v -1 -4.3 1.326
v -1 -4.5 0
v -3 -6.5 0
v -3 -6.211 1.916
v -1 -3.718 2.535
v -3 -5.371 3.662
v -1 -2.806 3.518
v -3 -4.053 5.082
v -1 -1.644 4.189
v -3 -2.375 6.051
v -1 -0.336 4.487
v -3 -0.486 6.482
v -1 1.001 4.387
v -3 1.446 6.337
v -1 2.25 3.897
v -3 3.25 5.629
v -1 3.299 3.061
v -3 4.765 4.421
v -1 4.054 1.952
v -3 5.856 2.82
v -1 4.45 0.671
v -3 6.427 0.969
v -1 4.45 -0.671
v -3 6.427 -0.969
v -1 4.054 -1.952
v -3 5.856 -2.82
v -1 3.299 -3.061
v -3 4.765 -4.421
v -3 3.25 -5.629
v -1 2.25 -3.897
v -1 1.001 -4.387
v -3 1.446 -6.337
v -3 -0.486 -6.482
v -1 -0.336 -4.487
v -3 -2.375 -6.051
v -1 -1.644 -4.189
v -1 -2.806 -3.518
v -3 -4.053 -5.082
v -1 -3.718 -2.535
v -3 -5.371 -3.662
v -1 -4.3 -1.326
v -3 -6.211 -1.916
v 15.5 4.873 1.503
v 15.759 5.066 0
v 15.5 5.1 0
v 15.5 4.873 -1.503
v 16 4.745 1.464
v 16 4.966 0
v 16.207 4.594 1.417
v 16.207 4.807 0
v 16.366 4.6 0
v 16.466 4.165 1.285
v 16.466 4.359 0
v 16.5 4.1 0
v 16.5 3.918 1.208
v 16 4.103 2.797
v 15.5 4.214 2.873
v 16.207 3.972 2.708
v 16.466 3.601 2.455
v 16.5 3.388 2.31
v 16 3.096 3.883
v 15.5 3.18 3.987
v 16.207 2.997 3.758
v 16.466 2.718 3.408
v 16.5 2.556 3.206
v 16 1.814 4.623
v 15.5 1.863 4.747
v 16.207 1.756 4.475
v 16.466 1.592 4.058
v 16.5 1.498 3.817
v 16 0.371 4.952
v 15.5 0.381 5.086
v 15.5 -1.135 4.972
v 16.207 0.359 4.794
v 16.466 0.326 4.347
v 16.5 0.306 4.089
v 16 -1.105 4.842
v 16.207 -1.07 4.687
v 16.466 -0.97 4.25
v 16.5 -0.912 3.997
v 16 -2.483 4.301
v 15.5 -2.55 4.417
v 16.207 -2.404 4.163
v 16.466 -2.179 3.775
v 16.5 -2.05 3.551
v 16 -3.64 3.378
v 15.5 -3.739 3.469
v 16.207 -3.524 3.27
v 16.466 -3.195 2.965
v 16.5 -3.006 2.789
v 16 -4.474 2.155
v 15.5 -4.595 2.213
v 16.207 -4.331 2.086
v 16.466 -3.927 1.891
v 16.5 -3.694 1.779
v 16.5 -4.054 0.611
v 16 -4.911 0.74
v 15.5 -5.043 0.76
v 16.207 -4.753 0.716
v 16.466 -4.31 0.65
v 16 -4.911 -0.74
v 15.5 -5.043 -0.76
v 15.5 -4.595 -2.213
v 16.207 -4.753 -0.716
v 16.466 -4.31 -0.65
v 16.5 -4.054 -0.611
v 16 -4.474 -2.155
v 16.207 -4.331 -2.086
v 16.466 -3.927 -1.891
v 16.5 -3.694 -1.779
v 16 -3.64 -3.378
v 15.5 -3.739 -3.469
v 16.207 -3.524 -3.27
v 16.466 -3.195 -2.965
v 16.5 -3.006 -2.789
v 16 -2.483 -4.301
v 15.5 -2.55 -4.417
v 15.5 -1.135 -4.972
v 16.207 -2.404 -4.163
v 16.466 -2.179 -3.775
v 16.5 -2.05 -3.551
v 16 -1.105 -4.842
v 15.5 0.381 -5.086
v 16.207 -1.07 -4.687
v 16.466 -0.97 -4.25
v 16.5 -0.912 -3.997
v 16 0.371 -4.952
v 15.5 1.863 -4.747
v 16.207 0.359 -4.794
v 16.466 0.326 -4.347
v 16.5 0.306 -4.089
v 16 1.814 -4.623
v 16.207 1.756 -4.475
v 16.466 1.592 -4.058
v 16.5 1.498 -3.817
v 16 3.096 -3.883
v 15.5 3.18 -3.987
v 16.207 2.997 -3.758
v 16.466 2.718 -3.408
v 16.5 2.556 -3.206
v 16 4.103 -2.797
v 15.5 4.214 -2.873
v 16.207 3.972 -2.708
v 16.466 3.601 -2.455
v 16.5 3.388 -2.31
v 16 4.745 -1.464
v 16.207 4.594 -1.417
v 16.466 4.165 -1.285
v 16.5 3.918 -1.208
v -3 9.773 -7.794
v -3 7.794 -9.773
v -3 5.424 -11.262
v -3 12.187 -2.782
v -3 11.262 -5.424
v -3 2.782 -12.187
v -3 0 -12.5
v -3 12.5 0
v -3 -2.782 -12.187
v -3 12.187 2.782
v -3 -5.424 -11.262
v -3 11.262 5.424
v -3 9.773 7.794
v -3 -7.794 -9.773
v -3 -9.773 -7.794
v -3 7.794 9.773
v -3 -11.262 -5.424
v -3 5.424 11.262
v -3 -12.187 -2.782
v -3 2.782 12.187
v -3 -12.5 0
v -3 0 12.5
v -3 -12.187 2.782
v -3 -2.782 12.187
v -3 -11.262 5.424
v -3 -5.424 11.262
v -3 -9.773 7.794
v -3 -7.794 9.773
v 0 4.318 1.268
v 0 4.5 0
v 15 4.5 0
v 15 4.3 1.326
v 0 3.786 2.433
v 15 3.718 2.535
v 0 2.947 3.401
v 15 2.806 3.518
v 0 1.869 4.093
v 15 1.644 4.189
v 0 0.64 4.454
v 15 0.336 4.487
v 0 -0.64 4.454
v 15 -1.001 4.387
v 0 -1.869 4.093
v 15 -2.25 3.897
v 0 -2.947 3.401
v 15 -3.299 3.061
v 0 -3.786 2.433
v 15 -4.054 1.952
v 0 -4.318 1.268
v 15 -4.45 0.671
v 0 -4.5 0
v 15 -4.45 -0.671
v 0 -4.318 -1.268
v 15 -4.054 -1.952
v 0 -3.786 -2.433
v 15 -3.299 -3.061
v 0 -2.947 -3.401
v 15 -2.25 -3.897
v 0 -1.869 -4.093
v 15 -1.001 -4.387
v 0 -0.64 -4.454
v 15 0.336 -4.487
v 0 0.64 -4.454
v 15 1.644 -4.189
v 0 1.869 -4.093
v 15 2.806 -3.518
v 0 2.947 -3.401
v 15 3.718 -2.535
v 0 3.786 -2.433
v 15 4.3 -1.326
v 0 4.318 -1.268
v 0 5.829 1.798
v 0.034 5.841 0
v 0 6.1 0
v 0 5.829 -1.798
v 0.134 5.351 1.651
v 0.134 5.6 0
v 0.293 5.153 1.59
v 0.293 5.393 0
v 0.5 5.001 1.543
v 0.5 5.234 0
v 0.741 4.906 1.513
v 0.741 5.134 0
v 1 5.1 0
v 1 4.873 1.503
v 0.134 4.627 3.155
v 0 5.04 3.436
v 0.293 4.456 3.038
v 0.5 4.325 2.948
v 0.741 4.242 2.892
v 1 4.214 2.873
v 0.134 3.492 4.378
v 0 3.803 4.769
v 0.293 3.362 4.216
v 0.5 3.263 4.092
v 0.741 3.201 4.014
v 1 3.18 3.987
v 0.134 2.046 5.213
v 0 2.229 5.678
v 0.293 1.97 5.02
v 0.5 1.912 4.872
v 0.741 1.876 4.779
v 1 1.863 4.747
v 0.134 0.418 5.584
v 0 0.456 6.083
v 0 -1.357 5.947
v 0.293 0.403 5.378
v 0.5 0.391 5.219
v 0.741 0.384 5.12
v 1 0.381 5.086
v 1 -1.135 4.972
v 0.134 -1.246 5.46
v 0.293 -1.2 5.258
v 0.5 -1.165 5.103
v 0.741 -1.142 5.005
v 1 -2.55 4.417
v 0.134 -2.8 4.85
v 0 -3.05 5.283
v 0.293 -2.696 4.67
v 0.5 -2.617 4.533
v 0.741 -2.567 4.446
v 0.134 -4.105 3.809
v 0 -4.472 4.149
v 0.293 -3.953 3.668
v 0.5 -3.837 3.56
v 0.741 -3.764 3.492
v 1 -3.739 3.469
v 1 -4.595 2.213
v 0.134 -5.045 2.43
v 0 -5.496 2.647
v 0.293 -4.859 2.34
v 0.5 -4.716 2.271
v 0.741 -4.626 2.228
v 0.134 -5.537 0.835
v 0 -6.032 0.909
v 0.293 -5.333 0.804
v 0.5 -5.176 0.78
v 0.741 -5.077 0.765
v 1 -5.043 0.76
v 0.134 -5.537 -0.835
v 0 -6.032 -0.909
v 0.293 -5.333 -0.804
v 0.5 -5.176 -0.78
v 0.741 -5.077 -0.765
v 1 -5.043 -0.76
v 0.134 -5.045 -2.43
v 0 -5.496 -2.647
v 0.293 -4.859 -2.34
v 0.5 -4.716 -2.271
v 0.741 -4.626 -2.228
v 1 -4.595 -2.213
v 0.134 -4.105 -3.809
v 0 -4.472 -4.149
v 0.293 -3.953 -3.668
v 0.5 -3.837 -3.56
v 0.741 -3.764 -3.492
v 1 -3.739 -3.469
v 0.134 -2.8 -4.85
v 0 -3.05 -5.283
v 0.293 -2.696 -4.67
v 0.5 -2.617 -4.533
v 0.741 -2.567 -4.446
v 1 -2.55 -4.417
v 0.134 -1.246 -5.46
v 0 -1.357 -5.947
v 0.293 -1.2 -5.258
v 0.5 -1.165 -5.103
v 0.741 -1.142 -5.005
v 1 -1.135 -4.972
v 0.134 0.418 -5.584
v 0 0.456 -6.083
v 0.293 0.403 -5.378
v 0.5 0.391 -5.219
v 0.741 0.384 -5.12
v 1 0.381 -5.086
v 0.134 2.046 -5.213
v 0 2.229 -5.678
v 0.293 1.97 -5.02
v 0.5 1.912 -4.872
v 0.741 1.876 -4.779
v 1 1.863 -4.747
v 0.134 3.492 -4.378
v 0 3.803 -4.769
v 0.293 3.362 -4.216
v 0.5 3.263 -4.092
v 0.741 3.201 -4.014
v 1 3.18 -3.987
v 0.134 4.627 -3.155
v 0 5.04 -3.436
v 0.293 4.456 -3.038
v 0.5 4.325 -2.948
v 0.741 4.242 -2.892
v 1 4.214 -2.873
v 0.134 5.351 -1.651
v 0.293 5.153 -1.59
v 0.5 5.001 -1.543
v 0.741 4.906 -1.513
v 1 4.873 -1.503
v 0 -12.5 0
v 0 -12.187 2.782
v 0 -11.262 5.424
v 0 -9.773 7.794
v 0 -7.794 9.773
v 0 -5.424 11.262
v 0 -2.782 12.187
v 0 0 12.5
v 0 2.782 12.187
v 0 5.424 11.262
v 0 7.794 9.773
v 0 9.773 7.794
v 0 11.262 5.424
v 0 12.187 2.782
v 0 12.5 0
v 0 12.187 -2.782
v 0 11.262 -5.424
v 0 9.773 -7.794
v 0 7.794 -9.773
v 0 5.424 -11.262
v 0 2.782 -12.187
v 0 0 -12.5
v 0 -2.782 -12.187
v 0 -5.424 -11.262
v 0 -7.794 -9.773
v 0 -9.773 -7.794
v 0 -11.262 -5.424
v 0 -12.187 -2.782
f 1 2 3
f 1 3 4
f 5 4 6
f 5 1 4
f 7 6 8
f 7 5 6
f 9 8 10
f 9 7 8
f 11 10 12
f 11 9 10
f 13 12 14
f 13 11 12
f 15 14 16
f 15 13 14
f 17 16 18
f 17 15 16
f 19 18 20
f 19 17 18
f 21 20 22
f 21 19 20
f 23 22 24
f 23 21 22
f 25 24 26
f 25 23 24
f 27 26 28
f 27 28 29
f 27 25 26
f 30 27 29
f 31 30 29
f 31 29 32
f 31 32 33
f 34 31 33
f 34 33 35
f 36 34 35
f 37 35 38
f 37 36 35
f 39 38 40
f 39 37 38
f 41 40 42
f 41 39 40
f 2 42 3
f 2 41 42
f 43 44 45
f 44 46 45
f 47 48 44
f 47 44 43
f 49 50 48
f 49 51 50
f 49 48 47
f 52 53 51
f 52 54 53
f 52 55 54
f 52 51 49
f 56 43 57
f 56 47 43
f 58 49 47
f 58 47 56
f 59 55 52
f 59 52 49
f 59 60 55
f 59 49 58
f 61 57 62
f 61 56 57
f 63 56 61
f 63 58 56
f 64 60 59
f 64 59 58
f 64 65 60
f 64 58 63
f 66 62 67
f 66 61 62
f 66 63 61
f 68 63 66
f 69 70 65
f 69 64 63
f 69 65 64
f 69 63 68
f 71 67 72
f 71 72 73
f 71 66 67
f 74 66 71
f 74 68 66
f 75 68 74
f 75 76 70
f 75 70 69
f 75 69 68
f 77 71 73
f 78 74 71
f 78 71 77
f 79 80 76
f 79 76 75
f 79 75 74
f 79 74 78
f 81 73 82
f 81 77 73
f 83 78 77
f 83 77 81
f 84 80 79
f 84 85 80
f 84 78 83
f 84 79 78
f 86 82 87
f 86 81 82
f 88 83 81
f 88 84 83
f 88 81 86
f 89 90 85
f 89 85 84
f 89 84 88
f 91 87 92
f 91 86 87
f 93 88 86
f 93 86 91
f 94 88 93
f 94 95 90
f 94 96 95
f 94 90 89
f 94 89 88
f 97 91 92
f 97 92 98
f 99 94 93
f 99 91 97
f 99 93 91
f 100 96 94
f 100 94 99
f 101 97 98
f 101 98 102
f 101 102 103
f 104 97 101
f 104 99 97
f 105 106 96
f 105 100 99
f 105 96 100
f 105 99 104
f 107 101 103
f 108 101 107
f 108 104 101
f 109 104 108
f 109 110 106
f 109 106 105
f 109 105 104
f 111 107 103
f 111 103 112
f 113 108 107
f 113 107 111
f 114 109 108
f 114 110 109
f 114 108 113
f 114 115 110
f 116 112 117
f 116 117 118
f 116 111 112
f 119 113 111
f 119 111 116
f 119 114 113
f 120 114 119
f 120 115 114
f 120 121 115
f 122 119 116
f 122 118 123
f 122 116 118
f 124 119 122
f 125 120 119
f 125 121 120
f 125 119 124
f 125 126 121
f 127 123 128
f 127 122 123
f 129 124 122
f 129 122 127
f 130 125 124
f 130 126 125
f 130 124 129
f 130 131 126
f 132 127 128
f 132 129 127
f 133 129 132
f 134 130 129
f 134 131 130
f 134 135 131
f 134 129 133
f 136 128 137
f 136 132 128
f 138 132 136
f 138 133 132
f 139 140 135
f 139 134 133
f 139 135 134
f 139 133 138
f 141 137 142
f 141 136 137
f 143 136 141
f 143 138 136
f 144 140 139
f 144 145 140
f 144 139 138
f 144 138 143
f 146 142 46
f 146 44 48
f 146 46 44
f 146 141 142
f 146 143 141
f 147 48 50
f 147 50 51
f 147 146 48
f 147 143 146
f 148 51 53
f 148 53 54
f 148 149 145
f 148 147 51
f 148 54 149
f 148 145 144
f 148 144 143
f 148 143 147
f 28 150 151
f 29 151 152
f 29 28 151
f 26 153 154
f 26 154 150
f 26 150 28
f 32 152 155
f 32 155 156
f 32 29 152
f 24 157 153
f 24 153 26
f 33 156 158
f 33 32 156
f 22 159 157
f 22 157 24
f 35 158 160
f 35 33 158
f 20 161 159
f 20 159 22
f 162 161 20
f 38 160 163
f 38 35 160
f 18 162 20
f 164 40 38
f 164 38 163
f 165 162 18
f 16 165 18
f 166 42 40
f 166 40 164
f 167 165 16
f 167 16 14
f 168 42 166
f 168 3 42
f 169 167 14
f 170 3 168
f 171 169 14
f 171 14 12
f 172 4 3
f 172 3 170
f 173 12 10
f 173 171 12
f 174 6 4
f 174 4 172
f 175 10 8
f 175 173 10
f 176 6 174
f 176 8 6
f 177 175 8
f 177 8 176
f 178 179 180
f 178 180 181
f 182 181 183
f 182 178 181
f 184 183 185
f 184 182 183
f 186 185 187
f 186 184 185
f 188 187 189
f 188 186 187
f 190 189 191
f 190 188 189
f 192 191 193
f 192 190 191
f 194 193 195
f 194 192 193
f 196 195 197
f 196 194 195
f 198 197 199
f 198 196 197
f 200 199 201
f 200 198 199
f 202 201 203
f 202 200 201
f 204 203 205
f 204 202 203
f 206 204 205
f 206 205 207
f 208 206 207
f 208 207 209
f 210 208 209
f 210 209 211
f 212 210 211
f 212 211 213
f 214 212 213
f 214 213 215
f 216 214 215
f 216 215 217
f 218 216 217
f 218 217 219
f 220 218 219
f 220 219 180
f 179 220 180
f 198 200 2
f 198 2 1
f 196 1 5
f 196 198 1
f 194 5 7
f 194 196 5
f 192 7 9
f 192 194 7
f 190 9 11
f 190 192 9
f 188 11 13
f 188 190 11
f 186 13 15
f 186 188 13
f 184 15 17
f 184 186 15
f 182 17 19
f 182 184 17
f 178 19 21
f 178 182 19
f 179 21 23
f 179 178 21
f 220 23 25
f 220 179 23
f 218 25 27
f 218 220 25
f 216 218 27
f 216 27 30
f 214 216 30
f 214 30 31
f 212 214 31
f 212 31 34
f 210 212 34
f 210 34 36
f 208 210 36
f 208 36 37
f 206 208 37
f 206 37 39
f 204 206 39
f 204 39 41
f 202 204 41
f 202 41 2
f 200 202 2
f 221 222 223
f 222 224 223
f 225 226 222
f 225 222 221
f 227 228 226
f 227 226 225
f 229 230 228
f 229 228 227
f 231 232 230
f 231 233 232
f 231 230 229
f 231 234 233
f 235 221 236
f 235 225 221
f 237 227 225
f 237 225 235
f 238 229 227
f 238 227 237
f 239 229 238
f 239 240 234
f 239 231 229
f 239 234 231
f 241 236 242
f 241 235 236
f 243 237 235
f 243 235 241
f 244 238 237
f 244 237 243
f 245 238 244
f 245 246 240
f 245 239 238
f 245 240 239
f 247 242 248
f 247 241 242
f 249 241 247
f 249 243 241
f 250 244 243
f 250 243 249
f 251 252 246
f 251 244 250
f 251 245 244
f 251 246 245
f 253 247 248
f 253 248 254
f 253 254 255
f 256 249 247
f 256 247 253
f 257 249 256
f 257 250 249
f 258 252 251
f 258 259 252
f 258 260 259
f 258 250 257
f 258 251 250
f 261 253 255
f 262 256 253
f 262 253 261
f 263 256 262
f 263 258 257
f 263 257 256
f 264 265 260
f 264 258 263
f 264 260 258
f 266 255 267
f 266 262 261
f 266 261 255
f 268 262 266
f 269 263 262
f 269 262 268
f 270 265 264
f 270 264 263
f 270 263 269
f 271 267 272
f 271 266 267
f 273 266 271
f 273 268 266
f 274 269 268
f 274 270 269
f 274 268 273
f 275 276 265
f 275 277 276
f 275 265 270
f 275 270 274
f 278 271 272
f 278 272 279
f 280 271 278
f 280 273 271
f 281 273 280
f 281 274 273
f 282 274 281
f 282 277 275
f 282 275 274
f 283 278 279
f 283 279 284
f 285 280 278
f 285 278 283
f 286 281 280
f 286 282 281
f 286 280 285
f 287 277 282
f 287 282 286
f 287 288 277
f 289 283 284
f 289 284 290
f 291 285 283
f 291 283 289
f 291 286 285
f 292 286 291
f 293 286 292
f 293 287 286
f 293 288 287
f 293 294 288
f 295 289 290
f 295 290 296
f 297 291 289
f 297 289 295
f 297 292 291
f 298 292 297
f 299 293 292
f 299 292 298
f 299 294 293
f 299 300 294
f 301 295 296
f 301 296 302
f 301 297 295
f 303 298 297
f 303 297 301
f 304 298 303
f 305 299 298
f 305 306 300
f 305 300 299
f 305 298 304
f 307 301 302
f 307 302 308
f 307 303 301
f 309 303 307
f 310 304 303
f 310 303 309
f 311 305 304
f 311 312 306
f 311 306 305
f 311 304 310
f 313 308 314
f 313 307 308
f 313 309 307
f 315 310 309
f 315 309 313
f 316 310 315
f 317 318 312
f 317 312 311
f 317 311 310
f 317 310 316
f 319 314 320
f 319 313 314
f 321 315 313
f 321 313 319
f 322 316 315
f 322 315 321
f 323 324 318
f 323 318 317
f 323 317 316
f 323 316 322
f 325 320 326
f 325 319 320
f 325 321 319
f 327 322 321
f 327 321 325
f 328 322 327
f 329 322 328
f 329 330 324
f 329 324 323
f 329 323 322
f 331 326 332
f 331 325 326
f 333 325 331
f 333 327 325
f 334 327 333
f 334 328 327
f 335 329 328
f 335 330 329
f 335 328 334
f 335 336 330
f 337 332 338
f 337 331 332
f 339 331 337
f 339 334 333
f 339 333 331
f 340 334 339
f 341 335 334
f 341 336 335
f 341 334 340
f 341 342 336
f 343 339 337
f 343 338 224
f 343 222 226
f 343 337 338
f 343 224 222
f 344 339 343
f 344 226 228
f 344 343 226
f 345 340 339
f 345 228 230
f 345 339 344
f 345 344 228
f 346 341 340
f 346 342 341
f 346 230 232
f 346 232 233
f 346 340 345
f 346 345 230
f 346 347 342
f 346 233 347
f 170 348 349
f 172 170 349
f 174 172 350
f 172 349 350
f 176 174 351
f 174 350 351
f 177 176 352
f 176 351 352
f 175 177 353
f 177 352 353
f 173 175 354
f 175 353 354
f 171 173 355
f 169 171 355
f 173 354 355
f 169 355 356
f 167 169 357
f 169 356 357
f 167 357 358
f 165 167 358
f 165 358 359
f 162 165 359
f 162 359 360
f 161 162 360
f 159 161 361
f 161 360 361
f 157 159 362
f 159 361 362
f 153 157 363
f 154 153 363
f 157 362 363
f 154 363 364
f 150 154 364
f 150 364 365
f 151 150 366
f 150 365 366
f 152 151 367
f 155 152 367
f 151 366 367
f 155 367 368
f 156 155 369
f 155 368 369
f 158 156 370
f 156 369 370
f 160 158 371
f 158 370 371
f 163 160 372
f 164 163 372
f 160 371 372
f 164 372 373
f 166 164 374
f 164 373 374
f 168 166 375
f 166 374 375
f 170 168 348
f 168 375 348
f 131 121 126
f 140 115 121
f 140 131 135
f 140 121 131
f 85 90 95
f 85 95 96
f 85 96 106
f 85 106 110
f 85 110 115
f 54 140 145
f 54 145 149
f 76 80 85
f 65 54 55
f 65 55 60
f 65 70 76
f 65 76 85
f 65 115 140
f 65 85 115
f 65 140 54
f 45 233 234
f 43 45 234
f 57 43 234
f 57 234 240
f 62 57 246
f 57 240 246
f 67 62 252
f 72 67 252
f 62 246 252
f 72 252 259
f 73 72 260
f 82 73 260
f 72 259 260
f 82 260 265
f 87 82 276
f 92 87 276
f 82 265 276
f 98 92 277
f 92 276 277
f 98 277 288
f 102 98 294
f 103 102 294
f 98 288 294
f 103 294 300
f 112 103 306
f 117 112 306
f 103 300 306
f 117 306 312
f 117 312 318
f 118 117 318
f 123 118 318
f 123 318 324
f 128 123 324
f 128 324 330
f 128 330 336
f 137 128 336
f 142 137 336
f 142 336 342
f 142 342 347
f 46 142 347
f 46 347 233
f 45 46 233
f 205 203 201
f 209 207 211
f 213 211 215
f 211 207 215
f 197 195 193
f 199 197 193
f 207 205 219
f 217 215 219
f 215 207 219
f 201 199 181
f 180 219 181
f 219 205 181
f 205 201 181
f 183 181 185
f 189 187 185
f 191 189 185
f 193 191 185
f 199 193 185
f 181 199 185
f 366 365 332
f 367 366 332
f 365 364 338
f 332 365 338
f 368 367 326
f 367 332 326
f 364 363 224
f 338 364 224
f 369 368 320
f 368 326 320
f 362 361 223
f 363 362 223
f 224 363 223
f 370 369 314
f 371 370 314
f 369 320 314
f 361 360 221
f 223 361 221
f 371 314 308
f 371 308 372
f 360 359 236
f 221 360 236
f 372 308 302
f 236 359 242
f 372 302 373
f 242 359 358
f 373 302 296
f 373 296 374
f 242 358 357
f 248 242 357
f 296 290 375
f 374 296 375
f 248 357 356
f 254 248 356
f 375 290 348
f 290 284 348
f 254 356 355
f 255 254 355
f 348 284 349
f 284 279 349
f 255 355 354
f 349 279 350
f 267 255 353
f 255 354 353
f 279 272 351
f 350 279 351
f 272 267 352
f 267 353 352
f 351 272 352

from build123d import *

# Parameters (mm, degrees)
F0_R     = 5.1
F0_R_2   = 4.5
F1_DEPTH = 15
F2_R     = 5.1
F3_DEPTH = 1.5
F4_R     = 12.5
F4_R_2   = 4.5
F5_DEPTH = 3
F6_R     = 1
F7_SIZE  = 2


with BuildPart() as f1:
    # F0 (on Right) → F1 (new body)
    with BuildSketch(Plane.YZ):
        Circle(F0_R)
        Circle(F0_R_2, mode=Mode.SUBTRACT)
    extrude(amount=F1_DEPTH)

    # F2 (on face) → F3 (join)
    with BuildSketch(Plane.YZ.offset(15)):
        Circle(F2_R)
    extrude(amount=F3_DEPTH)

    # F4 (on face) → F5 (join)
    with BuildSketch(Plane(origin=(0, 0, 0), x_dir=(0, -1, 0), z_dir=(-1, 0, 0))):
        Circle(F4_R)
        Circle(F4_R_2, mode=Mode.SUBTRACT)
    extrude(amount=F5_DEPTH)

    # F6
    f6_edges = [f1.edges().sort_by_distance(p)[0] for p in [
        (16.5, -5.1, 0),
        (0, -5.1, 0),
    ]]
    fillet(f6_edges, radius=F6_R)

    # F7
    f7_edges = [f1.edges().sort_by_distance(p)[0] for p in [
        (-3, 4.5, 0),
    ]]
    chamfer(f7_edges, length=F7_SIZE)


solid = f1.part
